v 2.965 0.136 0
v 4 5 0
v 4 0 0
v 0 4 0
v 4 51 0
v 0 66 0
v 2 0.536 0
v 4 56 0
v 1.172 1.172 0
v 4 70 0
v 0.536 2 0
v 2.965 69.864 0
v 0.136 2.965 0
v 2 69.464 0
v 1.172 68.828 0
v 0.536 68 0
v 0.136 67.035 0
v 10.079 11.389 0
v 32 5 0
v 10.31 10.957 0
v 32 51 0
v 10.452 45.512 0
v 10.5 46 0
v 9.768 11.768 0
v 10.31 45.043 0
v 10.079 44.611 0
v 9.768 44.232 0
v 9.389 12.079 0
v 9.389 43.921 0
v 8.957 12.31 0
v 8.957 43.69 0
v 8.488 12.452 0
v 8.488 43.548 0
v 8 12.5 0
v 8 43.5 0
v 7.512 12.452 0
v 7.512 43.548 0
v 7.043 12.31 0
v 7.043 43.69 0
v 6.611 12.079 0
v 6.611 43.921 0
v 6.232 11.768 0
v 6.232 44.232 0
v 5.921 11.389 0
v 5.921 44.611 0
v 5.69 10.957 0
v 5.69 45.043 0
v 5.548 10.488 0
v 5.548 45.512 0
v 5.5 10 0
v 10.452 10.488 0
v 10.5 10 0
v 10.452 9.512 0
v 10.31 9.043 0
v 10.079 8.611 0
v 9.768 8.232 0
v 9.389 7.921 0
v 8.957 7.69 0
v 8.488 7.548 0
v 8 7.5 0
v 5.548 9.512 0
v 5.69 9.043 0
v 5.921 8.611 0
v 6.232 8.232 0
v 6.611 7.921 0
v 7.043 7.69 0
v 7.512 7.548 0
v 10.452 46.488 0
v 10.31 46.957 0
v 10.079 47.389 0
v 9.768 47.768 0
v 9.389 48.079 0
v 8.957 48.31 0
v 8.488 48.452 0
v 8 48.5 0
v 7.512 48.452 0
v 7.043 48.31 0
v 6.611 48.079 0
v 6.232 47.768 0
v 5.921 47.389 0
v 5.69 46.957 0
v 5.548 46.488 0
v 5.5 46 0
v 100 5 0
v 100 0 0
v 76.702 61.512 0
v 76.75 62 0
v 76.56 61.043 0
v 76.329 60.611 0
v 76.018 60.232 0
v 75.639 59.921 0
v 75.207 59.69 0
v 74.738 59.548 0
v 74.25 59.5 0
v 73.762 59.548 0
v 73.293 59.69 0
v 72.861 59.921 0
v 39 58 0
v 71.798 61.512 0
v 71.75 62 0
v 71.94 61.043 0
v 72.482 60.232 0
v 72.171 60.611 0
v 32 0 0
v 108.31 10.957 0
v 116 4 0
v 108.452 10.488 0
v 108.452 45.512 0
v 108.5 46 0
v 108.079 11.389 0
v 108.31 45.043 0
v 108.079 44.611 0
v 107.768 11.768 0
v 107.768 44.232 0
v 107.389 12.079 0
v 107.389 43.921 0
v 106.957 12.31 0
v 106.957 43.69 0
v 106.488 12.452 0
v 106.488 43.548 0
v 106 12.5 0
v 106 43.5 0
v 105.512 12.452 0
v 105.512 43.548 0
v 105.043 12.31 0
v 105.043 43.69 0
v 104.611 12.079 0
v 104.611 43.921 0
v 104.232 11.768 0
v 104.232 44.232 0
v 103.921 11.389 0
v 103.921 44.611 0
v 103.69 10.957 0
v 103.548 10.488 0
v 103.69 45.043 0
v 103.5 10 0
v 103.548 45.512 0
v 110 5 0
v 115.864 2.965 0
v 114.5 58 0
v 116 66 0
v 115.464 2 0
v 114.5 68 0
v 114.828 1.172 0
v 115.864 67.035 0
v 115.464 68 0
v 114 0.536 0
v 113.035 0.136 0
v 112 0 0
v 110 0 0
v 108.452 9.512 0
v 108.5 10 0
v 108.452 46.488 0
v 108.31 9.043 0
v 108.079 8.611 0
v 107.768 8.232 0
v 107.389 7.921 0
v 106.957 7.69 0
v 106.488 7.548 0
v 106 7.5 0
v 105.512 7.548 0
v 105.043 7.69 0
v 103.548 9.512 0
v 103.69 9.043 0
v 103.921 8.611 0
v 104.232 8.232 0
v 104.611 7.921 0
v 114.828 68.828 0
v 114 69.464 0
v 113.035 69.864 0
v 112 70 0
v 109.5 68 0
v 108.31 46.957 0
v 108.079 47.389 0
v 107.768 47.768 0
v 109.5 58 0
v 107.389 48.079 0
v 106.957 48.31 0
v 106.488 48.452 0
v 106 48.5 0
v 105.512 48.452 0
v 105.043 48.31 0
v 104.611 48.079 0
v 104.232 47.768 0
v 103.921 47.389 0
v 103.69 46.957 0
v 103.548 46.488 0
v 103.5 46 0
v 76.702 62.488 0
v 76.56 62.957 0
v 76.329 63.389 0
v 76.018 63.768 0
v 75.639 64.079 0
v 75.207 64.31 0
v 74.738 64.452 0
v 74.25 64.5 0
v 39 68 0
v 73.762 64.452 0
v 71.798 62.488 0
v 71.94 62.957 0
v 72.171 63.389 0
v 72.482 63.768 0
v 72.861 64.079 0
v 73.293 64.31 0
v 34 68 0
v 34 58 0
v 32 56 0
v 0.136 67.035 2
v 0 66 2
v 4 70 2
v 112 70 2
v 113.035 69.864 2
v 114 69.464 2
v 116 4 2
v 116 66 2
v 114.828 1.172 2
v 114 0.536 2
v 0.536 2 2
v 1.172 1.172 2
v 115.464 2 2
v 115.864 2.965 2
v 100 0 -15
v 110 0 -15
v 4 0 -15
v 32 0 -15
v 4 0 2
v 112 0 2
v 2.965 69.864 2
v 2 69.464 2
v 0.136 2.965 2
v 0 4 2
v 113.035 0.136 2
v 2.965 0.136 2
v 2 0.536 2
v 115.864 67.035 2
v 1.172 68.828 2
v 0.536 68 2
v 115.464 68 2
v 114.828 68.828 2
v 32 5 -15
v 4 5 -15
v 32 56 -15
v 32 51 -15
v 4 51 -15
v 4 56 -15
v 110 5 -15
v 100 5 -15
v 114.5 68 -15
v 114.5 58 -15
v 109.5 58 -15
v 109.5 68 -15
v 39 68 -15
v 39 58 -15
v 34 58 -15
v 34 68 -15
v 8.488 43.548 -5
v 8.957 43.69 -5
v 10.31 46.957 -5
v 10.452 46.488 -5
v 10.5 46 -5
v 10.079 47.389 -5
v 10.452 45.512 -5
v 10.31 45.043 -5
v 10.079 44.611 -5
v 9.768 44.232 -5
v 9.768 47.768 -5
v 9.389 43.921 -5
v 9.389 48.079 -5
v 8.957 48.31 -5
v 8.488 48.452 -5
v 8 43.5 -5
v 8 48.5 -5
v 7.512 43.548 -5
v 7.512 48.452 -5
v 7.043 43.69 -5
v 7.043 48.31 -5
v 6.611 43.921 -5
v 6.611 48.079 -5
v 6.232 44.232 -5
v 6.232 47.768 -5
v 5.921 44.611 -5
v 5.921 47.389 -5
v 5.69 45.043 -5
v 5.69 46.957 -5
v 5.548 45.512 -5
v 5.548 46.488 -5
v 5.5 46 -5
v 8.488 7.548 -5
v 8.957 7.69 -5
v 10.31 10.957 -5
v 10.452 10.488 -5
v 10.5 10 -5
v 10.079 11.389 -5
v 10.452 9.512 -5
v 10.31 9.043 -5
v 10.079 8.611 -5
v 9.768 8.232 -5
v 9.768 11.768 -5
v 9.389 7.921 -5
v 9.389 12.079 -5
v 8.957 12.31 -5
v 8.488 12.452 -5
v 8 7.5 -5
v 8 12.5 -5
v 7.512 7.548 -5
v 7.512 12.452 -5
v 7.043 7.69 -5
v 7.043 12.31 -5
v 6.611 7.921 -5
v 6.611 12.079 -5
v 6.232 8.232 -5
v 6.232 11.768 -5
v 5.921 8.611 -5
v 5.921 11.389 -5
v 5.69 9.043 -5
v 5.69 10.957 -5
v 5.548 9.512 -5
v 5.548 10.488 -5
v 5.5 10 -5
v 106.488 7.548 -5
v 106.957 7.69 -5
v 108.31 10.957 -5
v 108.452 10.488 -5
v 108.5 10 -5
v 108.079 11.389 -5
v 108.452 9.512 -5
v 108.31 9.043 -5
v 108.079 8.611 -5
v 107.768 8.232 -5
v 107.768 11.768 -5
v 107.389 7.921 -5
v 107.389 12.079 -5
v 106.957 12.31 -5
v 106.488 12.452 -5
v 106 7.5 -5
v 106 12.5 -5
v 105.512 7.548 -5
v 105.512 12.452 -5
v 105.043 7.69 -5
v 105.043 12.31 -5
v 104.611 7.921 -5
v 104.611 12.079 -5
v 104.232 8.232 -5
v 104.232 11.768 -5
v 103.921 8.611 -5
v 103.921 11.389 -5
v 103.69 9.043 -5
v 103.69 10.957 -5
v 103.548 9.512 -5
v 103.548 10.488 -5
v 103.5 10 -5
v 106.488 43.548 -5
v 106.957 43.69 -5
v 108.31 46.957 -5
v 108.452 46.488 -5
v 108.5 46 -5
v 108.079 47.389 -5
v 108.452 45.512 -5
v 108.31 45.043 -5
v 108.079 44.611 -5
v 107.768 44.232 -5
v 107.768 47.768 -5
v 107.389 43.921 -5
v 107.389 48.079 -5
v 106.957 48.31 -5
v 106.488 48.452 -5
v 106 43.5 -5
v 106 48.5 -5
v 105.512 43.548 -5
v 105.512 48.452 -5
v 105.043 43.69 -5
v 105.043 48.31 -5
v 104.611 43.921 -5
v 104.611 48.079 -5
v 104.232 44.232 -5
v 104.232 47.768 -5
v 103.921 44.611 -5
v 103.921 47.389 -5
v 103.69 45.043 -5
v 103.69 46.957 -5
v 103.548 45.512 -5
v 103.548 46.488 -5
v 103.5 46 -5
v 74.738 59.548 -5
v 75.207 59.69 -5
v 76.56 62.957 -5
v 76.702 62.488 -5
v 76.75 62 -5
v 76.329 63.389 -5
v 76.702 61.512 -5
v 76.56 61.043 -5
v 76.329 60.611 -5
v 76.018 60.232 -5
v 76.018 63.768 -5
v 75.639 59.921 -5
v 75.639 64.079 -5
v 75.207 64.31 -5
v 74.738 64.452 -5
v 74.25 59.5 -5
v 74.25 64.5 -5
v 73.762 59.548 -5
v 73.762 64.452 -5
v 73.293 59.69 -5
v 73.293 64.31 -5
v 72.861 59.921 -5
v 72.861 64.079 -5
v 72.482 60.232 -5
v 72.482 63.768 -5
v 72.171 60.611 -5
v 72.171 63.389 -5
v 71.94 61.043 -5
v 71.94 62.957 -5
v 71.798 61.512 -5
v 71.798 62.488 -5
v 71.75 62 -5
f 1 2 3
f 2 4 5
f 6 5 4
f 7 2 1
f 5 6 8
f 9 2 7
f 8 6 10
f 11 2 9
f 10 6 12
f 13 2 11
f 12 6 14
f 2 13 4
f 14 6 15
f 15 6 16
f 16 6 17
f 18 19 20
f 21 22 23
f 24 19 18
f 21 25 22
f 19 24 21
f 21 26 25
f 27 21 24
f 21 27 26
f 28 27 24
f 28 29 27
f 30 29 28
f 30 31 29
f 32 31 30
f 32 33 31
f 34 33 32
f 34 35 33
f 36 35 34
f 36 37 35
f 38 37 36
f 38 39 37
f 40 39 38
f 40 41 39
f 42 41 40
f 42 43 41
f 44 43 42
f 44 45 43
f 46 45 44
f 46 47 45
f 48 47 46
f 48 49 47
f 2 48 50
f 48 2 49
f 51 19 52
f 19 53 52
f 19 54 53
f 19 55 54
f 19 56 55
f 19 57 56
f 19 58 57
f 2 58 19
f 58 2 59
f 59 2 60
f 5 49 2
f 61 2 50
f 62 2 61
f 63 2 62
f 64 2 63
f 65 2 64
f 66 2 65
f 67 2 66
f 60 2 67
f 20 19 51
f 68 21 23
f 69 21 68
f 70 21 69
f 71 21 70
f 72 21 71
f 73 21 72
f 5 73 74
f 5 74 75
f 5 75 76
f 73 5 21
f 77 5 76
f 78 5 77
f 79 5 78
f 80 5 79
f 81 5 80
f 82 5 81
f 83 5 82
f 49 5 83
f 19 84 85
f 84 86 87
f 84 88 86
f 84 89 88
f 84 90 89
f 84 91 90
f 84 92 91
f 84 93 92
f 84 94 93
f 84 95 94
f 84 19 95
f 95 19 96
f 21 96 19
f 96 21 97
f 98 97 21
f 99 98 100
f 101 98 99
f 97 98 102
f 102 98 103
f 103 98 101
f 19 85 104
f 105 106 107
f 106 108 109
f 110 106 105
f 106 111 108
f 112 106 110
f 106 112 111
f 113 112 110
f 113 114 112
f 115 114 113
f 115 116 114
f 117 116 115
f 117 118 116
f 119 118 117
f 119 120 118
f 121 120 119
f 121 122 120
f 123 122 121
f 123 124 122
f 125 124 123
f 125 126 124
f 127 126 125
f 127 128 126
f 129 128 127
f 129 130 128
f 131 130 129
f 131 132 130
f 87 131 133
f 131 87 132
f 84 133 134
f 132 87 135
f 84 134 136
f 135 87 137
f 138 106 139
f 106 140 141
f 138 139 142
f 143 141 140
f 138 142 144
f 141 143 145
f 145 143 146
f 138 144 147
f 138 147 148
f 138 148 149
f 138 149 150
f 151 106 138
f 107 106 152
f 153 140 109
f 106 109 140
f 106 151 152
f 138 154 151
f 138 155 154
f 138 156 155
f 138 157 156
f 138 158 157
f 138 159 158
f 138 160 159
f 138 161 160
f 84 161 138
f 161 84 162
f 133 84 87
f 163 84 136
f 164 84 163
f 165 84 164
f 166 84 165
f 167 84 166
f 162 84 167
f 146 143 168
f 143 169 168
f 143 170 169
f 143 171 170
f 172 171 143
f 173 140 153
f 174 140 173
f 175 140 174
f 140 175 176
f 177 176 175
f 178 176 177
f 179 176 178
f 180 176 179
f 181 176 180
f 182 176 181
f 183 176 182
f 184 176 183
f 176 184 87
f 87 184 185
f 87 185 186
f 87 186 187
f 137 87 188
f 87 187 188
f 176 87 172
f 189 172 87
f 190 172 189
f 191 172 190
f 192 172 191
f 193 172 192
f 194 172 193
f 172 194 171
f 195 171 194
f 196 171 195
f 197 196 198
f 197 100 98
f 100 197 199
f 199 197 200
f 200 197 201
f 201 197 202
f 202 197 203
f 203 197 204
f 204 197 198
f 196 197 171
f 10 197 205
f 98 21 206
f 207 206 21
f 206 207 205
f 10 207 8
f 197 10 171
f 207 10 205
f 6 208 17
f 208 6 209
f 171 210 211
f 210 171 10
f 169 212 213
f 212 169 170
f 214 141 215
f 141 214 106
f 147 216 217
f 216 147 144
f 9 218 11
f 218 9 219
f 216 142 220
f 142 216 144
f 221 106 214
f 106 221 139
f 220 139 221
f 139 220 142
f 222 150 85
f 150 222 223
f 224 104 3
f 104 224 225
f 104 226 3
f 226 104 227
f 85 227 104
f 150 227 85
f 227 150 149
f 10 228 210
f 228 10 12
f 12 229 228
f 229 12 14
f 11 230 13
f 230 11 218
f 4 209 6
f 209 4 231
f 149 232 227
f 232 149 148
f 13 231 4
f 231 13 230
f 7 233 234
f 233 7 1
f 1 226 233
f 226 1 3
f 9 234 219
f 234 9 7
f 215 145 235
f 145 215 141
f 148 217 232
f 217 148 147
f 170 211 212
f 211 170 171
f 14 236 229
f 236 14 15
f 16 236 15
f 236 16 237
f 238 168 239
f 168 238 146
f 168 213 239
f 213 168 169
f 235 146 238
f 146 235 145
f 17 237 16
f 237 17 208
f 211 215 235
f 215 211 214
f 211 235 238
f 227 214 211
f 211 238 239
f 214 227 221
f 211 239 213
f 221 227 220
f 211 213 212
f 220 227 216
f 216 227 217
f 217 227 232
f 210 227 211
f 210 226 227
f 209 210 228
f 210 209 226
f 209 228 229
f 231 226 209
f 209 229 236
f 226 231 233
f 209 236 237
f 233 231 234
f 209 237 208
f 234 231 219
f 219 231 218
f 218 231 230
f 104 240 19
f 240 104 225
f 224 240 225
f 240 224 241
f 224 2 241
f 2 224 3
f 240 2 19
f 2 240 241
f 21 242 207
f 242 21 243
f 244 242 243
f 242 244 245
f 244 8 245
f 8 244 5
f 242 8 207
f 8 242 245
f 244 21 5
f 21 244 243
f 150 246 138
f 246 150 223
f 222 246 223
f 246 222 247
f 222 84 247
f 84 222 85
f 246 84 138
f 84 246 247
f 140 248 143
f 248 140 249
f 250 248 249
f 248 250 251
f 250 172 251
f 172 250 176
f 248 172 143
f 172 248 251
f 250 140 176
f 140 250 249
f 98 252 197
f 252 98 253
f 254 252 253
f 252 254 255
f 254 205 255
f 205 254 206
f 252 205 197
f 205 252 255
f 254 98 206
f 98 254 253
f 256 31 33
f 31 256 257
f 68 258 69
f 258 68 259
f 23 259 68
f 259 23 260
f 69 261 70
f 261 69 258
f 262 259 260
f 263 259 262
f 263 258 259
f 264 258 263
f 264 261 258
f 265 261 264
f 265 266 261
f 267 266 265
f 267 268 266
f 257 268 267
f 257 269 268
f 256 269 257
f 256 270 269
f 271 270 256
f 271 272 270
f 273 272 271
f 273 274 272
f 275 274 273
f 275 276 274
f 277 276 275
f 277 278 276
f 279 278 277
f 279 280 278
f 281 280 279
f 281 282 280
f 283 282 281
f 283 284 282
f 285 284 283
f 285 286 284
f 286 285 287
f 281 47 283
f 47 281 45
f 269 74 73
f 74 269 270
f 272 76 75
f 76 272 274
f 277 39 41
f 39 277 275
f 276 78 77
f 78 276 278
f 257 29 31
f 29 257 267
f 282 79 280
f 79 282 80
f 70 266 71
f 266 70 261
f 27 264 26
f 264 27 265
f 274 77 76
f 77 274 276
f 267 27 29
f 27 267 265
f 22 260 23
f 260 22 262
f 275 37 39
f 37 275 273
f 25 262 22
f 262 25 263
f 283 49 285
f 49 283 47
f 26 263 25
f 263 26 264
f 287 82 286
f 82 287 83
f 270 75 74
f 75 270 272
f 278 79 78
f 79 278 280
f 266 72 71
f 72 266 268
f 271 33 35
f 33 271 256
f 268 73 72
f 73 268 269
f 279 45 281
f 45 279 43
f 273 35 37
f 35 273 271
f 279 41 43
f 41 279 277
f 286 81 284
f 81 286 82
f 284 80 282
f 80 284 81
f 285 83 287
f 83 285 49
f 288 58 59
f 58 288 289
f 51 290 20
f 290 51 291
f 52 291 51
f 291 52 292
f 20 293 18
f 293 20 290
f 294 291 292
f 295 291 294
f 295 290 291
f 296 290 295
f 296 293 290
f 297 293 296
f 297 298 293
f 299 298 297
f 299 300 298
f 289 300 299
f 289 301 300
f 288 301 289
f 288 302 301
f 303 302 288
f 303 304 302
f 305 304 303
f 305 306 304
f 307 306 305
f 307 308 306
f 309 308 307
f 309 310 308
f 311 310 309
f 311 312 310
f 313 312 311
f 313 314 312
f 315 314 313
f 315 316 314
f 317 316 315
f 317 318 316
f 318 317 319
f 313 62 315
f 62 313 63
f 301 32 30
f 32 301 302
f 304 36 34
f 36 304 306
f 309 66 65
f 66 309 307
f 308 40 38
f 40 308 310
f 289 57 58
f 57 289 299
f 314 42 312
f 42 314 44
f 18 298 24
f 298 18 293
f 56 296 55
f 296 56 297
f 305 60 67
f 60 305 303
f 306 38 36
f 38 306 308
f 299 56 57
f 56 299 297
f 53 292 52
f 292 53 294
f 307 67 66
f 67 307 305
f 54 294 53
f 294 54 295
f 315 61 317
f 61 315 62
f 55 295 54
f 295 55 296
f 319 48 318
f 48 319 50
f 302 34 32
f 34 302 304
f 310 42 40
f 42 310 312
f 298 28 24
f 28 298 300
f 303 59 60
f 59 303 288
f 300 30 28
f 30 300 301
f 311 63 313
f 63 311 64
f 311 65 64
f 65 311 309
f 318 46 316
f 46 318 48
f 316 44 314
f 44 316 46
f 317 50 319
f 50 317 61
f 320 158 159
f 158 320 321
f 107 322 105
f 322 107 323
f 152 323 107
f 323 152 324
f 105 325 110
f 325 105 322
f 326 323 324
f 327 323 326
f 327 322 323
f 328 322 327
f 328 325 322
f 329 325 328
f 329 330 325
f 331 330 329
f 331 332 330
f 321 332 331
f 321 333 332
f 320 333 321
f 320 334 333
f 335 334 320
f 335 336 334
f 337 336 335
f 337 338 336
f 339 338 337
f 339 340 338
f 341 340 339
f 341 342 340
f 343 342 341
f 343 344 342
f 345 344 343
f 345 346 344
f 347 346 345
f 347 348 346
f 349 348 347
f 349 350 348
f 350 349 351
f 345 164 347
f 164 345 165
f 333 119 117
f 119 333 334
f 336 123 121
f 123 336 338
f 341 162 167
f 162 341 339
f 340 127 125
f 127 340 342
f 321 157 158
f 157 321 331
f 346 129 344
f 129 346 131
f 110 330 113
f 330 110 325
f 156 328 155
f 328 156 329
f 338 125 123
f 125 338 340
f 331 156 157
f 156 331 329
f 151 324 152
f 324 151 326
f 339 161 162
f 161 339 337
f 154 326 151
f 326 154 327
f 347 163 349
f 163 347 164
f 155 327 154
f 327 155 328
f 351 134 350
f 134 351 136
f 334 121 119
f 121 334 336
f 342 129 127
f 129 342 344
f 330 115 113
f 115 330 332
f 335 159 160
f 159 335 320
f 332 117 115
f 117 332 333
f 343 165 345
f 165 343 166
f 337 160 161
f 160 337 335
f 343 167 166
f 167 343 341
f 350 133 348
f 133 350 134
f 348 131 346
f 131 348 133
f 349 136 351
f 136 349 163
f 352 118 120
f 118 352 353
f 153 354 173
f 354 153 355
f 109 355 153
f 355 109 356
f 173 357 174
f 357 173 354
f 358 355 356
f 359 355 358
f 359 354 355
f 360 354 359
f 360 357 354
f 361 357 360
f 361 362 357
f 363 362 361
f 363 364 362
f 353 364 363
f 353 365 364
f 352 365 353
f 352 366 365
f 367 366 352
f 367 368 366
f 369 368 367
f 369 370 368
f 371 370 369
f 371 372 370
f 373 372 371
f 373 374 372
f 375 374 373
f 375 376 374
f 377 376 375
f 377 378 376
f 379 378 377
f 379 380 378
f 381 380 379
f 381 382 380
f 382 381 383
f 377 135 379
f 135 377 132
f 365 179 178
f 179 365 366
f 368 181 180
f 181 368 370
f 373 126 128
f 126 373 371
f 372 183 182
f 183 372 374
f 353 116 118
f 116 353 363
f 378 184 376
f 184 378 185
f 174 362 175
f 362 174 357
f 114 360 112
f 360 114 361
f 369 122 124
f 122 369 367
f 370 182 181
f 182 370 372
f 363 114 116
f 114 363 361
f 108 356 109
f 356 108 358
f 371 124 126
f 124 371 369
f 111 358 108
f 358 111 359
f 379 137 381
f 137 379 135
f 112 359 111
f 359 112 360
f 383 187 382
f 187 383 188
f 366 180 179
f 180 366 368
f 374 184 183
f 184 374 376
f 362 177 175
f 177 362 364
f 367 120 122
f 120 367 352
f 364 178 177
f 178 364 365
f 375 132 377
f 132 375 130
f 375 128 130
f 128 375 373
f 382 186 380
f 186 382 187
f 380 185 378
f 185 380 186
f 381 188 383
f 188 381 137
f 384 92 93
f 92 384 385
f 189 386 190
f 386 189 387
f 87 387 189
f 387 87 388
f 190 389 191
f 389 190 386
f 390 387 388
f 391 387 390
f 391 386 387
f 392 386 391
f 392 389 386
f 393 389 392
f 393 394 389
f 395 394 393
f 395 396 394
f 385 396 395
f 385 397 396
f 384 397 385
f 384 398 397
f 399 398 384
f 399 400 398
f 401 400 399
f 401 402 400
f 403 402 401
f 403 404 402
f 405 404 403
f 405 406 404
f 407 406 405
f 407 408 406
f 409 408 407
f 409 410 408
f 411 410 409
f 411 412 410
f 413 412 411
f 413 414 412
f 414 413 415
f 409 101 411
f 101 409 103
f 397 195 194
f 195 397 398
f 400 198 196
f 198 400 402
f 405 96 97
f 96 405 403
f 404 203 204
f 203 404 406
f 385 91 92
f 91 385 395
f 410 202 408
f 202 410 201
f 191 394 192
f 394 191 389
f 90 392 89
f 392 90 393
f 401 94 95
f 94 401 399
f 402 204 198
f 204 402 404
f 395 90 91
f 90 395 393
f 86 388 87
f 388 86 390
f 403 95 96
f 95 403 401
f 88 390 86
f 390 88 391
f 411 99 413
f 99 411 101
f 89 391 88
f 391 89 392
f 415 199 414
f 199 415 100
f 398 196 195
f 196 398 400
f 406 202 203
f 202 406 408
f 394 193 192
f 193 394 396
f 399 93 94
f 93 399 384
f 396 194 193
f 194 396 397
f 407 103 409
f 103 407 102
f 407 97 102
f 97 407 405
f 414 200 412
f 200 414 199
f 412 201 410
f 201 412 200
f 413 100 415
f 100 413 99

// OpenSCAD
/* tray_height = 15; */
tray_height = 2;
tray_length = 145-29;
tray_depth = 70;
tray_corner_rad = 4;
tab_height = 15;
tab_depth = 5;
feet_height = 5;
feet_diam = 5;


mixer_main_depth=46;
mixer_back_width=70.5;
mixer_back_xoffset=6.5;
mixer_back_tab_yoffset=7;


// tray
hull() {
    translate([tray_corner_rad,tray_corner_rad,0]) cylinder(h=tray_height, r=tray_corner_rad, $fn=24);
    translate([tray_length-tray_corner_rad,tray_corner_rad,0]) cylinder(h=tray_height, r=tray_corner_rad, $fn=24);
    translate([tray_corner_rad,tray_depth-tray_corner_rad,0]) cylinder(h=tray_height, r=tray_corner_rad, $fn=24);
    translate([tray_length-tray_corner_rad,tray_depth-tray_corner_rad,0]) cylinder(h=tray_height, r=tray_corner_rad, $fn=24);
    }
/* cube([tray_length, tray_depth, tray_height]); */


// tabs
translate([4, 0, -tab_height]) cube([28, tab_depth, tab_height]);
translate([4, tab_depth+mixer_main_depth, -tab_height]) cube([28, tab_depth, tab_height]);

translate([tray_length-16, 0, -tab_height]) cube([10, tab_depth, tab_height]);

translate([tray_length-mixer_back_xoffset, tab_depth+mixer_main_depth+mixer_back_tab_yoffset, -tab_height]) cube([tab_depth, 10, tab_height]);

translate([tray_length-mixer_back_xoffset-mixer_back_width-tab_depth, tab_depth+mixer_main_depth+mixer_back_tab_yoffset, -tab_height]) cube([tab_depth, 10, tab_height]);

/* #translate([32, tab_depth+mixer_main_depth, -10]) cube([7,7,10]); */

// feet
translate([8, tab_depth+mixer_main_depth-5, -feet_height]) cylinder(d=feet_diam, h=feet_height, $fn=32);
translate([8, tab_depth+5, -feet_height]) cylinder(d=feet_diam, h=feet_height, $fn=32);

translate([tray_length-10, tab_depth+5, -feet_height]) cylinder(d=feet_diam, h=feet_height, $fn=32);
translate([tray_length-10, tab_depth+mixer_main_depth-5, -feet_height]) cylinder(d=feet_diam, h=feet_height, $fn=32);

translate([tray_length-mixer_back_xoffset-mixer_back_width/2, tab_depth+57, -feet_height]) cylinder(d=feet_diam, h=feet_height, $fn=32);
